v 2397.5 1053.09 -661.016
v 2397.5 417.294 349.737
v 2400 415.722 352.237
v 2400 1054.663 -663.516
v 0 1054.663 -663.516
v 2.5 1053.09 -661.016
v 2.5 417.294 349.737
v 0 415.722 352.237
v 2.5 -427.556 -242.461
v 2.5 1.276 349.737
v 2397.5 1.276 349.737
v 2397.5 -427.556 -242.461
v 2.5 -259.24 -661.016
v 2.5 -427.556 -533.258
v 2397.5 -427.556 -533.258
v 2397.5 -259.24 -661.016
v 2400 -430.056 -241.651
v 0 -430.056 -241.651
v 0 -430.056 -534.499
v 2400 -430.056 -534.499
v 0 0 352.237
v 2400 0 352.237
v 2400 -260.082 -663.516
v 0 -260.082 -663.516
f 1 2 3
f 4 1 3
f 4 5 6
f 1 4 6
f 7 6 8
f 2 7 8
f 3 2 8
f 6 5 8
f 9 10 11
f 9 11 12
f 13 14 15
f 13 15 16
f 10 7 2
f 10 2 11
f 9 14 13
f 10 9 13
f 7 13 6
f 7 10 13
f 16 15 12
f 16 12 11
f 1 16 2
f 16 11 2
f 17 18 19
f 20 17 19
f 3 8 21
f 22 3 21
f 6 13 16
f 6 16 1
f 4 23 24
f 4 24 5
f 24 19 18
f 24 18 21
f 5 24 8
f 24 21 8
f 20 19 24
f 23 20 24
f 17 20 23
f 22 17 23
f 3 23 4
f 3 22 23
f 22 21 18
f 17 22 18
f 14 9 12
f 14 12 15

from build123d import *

# Parameters (mm, degrees)
F1_DEPTH = 2400
F2_T     = -2.5


with BuildPart() as f1:
    # F0 (on Right) → F1 (new body)
    with BuildSketch(Plane.YZ):
        Polygon((1054.663021, -663.515762), (415.721765, 352.237196), (0, 352.237196), (-430.056426, -241.650613), (-430.056426, -534.498729), (-260.08166, -663.515762), align=None)
    extrude(amount=F1_DEPTH)

    # F2
    f2_openings = [f1.faces().sort_by_distance(p)[0] for p in [
        (1200, 735.192393, -155.639283),
    ]]
    offset(amount=F2_T, openings=f2_openings)


solid = f1.part
